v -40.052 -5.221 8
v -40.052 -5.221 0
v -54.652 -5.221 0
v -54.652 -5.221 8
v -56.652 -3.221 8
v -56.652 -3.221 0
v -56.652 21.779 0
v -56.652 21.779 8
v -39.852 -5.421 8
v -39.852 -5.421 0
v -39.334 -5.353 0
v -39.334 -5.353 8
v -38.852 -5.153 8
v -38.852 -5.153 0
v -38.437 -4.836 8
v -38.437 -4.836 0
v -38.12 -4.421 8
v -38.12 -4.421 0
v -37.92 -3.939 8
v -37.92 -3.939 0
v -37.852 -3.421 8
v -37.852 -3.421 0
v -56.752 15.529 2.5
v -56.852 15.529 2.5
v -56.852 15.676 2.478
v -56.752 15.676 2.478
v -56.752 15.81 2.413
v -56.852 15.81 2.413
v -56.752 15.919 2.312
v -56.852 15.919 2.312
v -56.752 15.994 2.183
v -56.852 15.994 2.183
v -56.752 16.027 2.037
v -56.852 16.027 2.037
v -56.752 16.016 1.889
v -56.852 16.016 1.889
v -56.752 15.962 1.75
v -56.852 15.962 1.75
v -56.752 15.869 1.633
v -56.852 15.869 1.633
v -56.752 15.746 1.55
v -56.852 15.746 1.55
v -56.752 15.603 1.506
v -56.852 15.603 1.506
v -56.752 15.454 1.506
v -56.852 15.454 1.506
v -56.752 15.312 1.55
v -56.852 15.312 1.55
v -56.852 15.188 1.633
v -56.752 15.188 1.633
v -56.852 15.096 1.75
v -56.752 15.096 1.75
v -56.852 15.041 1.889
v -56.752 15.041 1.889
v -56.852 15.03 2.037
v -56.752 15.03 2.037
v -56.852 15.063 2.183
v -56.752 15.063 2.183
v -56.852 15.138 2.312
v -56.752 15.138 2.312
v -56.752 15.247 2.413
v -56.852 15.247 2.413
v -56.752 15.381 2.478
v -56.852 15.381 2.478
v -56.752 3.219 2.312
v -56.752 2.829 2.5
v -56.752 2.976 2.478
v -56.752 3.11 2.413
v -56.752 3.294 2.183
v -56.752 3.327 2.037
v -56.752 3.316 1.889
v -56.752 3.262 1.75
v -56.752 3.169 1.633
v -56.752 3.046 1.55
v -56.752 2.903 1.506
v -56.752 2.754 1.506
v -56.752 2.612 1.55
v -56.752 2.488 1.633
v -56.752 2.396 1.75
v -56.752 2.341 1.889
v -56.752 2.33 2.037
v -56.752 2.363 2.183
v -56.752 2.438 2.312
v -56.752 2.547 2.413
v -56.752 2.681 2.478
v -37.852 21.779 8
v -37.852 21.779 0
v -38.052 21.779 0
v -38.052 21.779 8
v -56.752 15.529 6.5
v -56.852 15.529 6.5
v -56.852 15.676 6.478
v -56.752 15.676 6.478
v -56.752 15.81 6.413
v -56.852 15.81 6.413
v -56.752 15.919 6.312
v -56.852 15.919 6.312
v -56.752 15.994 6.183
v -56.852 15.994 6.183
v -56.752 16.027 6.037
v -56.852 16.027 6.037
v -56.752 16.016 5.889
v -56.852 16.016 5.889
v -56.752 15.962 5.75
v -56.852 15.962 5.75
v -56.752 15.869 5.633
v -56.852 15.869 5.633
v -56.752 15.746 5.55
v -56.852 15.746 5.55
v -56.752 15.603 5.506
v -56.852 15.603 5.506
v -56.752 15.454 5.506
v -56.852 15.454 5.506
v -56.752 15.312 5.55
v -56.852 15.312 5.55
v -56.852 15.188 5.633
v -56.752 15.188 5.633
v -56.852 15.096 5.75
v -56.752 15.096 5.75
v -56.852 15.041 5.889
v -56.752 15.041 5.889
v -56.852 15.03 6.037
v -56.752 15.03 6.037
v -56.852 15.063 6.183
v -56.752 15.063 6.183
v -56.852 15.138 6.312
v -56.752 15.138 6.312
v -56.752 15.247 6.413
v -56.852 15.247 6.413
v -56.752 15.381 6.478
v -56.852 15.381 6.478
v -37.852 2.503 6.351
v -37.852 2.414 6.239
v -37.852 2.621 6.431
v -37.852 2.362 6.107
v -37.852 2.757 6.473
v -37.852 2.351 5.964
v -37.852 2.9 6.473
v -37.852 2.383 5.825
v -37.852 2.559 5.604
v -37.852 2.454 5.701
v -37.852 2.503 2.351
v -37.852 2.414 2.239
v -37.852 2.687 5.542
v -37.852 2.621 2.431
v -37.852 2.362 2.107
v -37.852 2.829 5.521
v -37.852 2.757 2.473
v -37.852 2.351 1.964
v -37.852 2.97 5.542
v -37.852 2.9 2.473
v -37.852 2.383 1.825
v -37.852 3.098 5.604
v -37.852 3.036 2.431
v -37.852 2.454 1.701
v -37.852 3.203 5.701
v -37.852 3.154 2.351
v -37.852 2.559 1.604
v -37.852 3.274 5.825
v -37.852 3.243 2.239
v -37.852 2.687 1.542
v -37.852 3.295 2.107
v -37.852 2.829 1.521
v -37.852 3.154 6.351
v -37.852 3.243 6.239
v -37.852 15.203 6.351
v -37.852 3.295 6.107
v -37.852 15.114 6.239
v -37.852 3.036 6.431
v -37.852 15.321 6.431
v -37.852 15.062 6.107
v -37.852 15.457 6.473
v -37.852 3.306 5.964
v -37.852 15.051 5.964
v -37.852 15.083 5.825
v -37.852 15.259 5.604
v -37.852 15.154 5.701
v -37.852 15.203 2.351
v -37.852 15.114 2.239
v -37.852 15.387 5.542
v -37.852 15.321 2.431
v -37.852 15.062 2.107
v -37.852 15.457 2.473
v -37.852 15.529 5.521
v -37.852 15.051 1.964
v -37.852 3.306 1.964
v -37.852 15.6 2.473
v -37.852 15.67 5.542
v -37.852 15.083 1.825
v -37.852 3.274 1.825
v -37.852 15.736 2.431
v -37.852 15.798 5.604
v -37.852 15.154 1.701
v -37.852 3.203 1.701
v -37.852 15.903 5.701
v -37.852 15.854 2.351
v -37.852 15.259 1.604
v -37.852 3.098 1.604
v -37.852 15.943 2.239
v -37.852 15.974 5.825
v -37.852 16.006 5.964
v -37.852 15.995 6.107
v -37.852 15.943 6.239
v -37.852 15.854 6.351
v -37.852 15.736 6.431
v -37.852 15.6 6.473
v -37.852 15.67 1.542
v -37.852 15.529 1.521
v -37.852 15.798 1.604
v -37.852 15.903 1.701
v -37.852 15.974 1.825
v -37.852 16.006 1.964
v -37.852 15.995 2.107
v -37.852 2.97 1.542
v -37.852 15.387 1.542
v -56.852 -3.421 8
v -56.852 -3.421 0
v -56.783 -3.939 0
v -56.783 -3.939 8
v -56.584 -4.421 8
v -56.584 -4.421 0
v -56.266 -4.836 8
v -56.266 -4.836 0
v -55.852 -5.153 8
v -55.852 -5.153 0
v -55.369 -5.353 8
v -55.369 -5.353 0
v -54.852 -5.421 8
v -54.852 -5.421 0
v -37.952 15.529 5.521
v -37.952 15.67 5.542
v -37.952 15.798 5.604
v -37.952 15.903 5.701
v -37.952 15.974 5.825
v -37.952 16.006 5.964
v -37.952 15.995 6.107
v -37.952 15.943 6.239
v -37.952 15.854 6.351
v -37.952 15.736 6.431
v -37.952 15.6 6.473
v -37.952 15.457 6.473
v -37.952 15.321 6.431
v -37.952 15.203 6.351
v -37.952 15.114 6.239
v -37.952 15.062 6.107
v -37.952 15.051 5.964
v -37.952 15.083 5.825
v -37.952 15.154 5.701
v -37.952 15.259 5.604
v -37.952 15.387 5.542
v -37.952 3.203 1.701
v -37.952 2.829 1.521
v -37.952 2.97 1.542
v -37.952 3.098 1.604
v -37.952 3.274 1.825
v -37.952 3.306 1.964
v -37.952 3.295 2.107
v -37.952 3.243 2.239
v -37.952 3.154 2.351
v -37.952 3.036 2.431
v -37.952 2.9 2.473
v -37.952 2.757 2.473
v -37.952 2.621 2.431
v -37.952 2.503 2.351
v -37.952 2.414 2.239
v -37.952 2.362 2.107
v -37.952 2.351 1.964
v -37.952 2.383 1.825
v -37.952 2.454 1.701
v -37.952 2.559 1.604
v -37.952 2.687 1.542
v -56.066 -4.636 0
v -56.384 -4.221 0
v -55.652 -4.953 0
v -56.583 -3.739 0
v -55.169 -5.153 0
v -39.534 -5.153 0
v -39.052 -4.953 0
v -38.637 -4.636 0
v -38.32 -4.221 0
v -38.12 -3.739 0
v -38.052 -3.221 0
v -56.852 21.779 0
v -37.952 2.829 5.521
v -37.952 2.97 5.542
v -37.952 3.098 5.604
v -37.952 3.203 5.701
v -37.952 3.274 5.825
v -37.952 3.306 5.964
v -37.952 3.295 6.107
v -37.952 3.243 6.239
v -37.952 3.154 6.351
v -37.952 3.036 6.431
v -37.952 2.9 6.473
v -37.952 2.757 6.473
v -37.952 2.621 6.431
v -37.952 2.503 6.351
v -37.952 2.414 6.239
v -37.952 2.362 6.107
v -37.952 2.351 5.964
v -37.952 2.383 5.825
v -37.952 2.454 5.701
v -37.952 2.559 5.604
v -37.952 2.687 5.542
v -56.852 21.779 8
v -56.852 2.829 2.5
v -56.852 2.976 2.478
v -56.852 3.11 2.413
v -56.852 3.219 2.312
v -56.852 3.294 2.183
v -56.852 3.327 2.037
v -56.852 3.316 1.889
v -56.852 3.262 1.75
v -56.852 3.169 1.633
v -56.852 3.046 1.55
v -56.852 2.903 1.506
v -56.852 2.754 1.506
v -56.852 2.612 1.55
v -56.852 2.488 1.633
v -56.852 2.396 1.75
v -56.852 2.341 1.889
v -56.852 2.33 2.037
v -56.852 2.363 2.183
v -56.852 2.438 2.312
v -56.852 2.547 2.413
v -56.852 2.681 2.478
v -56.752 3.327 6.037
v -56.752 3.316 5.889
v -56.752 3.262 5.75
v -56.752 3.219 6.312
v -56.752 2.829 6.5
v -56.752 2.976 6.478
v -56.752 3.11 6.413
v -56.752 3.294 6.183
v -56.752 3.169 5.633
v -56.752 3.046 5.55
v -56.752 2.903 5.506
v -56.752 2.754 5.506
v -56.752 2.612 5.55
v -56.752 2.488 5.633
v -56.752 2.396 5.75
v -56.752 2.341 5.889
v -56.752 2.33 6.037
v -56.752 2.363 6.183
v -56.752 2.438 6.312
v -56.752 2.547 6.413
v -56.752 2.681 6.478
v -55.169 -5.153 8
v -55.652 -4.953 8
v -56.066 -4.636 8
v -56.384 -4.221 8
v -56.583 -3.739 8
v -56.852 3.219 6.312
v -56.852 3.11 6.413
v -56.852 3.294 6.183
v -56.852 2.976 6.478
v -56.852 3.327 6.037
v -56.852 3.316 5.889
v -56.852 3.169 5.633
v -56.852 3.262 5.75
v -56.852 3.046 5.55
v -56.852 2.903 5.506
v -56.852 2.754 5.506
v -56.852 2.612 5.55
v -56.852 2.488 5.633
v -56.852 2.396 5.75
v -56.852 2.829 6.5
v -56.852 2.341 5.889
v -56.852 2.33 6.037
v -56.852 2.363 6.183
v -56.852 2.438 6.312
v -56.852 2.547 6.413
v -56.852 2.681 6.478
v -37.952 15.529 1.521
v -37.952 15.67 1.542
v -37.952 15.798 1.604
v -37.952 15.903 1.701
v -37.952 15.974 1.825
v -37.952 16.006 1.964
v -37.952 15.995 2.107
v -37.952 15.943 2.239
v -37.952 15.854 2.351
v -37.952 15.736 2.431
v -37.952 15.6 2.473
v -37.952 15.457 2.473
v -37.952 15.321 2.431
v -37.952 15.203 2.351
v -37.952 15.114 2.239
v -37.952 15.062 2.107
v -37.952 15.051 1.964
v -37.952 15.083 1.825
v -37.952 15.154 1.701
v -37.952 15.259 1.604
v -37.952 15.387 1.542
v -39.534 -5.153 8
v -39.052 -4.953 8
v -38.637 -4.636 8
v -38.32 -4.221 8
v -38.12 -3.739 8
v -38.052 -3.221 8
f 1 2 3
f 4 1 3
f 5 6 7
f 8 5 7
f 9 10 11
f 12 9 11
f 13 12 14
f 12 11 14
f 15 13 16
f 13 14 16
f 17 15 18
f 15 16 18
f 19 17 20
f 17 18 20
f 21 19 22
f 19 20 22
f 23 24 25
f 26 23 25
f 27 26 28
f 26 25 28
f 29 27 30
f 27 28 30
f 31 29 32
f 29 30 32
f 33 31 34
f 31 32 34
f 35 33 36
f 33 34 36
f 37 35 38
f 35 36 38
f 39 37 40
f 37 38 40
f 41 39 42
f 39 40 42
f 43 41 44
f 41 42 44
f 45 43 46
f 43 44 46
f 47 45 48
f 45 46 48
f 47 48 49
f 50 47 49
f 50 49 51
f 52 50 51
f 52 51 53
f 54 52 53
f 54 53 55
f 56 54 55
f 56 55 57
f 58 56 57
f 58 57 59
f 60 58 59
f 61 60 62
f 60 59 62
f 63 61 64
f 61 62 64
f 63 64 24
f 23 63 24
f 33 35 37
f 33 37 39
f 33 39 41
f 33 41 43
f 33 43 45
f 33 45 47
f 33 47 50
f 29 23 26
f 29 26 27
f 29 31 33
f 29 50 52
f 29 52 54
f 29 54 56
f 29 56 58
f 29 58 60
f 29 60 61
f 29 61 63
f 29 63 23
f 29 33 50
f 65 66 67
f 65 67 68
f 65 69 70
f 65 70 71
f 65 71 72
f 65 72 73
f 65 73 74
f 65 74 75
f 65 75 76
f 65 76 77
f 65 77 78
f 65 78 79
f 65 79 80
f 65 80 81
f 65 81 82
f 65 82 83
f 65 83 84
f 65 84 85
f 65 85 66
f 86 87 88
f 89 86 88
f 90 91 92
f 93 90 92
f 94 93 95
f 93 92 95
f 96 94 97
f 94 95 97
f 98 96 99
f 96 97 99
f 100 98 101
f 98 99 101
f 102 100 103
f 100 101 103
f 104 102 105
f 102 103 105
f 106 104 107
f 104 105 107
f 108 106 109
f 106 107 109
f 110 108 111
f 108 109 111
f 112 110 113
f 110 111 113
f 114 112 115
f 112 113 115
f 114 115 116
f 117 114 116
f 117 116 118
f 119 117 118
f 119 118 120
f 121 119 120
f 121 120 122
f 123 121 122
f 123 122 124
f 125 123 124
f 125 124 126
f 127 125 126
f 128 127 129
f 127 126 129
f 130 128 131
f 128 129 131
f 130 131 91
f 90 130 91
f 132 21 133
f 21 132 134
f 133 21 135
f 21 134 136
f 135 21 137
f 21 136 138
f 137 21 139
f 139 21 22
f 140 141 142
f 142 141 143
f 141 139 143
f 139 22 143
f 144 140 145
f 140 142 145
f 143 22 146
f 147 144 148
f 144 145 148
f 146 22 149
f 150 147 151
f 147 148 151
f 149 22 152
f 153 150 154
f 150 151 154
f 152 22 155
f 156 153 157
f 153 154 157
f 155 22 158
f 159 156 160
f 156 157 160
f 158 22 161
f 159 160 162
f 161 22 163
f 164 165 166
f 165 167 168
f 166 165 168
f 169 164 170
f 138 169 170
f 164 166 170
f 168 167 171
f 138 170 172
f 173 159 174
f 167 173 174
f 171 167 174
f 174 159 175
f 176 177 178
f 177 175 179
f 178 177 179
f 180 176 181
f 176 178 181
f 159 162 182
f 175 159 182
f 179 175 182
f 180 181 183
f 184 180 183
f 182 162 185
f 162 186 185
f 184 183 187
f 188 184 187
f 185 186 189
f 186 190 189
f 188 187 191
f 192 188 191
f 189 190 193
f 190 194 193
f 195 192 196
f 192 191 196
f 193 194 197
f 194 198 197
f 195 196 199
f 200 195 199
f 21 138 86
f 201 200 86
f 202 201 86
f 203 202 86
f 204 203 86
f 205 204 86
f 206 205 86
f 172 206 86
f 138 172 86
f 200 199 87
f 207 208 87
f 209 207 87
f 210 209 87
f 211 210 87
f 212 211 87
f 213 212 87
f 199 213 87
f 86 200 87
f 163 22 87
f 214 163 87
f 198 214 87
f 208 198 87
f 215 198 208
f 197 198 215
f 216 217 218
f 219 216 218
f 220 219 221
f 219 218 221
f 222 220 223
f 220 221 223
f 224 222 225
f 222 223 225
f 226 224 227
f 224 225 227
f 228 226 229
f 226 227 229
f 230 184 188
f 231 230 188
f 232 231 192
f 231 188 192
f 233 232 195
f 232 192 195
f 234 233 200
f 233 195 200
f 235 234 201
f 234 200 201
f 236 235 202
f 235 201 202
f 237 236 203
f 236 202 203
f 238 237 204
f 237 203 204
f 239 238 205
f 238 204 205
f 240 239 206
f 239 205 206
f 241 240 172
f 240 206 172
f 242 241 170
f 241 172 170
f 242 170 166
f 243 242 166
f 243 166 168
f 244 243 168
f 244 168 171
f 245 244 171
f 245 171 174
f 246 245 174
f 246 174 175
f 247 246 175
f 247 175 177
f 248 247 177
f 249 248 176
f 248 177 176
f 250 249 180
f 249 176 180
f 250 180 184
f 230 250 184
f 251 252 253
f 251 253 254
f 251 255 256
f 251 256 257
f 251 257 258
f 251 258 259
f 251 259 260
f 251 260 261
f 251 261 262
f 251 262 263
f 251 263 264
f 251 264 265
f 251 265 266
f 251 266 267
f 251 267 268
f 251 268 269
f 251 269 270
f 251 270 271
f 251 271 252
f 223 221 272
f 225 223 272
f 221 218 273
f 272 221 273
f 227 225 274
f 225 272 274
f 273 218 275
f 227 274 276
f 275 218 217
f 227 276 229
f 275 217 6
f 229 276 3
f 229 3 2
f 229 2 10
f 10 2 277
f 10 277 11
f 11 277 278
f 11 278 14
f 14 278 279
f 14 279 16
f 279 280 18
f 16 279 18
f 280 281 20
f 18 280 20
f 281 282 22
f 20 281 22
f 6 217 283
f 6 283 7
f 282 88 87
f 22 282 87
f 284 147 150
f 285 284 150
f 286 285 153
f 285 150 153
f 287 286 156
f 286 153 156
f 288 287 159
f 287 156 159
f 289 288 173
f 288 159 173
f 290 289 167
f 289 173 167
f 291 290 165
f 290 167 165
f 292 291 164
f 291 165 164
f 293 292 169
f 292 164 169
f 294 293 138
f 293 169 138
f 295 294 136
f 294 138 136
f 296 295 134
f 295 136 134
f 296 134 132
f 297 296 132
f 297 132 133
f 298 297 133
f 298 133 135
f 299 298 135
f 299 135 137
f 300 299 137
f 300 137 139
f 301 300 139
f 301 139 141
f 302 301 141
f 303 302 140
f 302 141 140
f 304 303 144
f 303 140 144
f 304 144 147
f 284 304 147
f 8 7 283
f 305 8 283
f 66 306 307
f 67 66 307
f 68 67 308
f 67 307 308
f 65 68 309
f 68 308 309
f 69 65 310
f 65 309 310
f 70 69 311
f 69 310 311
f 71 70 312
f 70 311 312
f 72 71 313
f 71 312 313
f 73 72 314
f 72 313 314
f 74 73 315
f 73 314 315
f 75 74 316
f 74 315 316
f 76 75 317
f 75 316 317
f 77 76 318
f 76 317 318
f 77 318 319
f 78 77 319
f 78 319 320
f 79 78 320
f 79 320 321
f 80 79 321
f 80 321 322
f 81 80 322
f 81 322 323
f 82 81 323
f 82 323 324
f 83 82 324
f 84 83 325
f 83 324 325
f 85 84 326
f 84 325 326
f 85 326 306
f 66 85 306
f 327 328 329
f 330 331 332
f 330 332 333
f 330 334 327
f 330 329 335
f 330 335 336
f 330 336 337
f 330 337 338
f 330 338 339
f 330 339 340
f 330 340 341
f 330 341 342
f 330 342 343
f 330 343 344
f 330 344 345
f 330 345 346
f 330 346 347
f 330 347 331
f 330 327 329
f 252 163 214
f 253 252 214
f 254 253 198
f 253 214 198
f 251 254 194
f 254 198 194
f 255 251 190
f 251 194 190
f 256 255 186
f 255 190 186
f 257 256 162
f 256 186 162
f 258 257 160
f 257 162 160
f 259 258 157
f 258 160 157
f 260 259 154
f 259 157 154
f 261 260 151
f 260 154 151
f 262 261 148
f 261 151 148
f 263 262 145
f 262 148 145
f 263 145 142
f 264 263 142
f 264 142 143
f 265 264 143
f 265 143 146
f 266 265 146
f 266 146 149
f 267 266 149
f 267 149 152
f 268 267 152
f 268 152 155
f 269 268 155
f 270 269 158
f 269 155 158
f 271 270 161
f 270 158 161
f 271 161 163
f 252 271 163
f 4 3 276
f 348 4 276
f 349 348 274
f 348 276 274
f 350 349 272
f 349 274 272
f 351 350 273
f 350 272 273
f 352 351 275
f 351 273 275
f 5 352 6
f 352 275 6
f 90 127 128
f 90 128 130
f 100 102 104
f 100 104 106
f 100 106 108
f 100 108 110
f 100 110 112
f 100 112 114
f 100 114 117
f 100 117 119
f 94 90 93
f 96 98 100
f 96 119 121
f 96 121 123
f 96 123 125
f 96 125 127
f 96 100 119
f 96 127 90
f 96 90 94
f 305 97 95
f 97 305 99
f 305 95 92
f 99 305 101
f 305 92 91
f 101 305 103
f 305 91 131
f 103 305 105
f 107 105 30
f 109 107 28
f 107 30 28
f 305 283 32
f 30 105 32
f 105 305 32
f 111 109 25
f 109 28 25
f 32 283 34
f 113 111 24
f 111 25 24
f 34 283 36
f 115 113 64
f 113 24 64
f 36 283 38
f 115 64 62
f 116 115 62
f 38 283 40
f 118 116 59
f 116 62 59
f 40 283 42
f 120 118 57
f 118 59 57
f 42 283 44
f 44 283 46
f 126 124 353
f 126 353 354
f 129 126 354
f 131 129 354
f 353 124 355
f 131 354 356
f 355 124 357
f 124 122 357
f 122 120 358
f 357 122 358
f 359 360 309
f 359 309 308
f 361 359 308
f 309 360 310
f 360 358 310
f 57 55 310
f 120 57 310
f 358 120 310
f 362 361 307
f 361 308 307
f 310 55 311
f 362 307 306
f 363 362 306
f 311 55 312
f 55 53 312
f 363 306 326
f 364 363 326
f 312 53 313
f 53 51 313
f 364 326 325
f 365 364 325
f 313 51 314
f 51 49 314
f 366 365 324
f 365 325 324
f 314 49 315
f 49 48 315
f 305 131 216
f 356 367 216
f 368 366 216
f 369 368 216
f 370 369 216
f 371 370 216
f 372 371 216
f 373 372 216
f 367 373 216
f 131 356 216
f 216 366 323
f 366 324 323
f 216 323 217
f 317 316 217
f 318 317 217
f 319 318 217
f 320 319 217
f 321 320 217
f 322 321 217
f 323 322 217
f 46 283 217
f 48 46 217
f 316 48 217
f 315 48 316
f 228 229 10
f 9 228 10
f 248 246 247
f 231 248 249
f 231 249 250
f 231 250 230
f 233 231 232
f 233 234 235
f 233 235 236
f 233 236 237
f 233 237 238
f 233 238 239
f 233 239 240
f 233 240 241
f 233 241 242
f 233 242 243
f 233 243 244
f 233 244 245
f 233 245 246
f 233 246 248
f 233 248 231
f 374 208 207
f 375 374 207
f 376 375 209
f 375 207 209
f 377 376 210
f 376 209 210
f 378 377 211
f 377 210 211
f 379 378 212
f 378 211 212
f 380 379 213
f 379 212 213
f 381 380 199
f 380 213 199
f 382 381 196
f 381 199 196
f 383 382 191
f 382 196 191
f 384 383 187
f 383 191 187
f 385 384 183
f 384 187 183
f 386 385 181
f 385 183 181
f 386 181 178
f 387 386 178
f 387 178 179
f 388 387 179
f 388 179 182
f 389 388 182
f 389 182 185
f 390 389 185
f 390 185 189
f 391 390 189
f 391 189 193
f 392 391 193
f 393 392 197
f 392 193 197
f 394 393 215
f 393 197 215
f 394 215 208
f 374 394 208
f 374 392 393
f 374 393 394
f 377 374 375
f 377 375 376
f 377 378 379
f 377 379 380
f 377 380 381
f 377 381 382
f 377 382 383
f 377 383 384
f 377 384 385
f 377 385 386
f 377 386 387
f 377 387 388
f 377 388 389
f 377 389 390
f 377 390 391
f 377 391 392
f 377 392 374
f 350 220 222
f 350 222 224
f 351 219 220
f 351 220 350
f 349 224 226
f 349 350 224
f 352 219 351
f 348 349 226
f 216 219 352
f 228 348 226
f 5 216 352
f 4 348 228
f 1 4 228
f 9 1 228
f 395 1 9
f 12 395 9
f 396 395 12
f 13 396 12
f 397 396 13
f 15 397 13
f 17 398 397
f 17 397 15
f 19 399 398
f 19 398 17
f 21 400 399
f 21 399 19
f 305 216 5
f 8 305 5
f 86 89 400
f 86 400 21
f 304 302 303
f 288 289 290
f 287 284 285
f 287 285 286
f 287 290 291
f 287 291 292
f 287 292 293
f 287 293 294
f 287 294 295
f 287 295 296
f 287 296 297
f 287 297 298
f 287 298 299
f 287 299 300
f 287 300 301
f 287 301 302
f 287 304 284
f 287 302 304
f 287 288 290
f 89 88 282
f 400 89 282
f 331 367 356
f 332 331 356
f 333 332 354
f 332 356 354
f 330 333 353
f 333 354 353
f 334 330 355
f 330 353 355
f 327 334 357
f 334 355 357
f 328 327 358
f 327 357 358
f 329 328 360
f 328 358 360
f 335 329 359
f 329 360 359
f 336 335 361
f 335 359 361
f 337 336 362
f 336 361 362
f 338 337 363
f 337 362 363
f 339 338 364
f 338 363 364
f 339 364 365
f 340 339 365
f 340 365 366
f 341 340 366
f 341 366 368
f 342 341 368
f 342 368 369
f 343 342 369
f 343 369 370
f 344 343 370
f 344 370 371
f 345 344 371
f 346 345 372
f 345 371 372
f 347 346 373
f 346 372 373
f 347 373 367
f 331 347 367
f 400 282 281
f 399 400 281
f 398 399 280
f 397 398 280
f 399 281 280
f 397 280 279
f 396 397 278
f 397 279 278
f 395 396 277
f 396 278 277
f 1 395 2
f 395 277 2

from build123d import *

# Parameters (mm, degrees)
DODANIE_WYCI_GNI_CIE1_DEPTH = 8
SZKIC2_R                    = 0.478785513
WYTNIJ_WYCI_GNI_CIE1_DEPTH  = 0.1
SZKIC3_R                    = 0.5
WYTNIJ_WYCI_GNI_CIE2_DEPTH  = 0.1


with BuildPart() as part:
    # Szkic1 → Dodanie-wyciągnięcie1 (new body)
    with BuildSketch(Plane.XY):
        with BuildLine():
            Line((-56.651560295, 21.778571429), (-56.851560295, 21.778571429))
            Line((-56.851560295, 21.778571429), (-56.851560295, -3.421428571))
            ThreePointArc((-56.851560295, -3.421428571), (-56.265773857, -4.835642134), (-54.851560295, -5.421428571))
            Line((-54.851560295, -5.421428571), (-39.851560295, -5.421428571))
            ThreePointArc((-39.851560295, -5.421428571), (-38.437346732, -4.835642134), (-37.851560295, -3.421428571))
            Line((-37.851560295, -3.421428571), (-37.851560295, 21.778571429))
            Line((-37.851560295, 21.778571429), (-38.051560295, 21.778571429))
            Line((-38.051560295, 21.778571429), (-38.051560295, -3.221428571))
            ThreePointArc((-38.051560295, -3.221428571), (-38.637346732, -4.635642134), (-40.051560295, -5.221428571))
            Line((-40.051560295, -5.221428571), (-54.651560295, -5.221428571))
            ThreePointArc((-54.651560295, -5.221428571), (-56.065773857, -4.635642134), (-56.651560295, -3.221428571))
            Line((-56.651560295, -3.221428571), (-56.651560295, 21.778571429))
        make_face()
    extrude(amount=DODANIE_WYCI_GNI_CIE1_DEPTH)

    # Szkic2 → Wytnij-wyciągnięcie1 (cut)
    with BuildSketch(Plane(origin=(-37.851560295, 0, 0), x_dir=(0, 0, -1), z_dir=(1, 0, 0))):
        with Locations((-6, 15.528571429)):
            Circle(SZKIC2_R)
        with Locations((-2, 15.528571429)):
            Circle(SZKIC2_R)
        with Locations((-2, 2.828571429)):
            Circle(SZKIC2_R)
        with Locations((-6, 2.828571429)):
            Circle(SZKIC2_R)
    extrude(amount=-WYTNIJ_WYCI_GNI_CIE1_DEPTH, mode=Mode.SUBTRACT)

    # Szkic3 → Wytnij-wyciągnięcie2 (cut)
    with BuildSketch(Plane.ZY.offset(56.851560295)):
        with Locations((6, 15.528571429)):
            Circle(SZKIC3_R)
        with Locations((2, 15.528571429)):
            Circle(SZKIC3_R)
        with Locations((2, 2.828571429)):
            Circle(SZKIC3_R)
        with Locations((6, 2.828571429)):
            Circle(SZKIC3_R)
    extrude(amount=-WYTNIJ_WYCI_GNI_CIE2_DEPTH, mode=Mode.SUBTRACT)


solid = part.part
